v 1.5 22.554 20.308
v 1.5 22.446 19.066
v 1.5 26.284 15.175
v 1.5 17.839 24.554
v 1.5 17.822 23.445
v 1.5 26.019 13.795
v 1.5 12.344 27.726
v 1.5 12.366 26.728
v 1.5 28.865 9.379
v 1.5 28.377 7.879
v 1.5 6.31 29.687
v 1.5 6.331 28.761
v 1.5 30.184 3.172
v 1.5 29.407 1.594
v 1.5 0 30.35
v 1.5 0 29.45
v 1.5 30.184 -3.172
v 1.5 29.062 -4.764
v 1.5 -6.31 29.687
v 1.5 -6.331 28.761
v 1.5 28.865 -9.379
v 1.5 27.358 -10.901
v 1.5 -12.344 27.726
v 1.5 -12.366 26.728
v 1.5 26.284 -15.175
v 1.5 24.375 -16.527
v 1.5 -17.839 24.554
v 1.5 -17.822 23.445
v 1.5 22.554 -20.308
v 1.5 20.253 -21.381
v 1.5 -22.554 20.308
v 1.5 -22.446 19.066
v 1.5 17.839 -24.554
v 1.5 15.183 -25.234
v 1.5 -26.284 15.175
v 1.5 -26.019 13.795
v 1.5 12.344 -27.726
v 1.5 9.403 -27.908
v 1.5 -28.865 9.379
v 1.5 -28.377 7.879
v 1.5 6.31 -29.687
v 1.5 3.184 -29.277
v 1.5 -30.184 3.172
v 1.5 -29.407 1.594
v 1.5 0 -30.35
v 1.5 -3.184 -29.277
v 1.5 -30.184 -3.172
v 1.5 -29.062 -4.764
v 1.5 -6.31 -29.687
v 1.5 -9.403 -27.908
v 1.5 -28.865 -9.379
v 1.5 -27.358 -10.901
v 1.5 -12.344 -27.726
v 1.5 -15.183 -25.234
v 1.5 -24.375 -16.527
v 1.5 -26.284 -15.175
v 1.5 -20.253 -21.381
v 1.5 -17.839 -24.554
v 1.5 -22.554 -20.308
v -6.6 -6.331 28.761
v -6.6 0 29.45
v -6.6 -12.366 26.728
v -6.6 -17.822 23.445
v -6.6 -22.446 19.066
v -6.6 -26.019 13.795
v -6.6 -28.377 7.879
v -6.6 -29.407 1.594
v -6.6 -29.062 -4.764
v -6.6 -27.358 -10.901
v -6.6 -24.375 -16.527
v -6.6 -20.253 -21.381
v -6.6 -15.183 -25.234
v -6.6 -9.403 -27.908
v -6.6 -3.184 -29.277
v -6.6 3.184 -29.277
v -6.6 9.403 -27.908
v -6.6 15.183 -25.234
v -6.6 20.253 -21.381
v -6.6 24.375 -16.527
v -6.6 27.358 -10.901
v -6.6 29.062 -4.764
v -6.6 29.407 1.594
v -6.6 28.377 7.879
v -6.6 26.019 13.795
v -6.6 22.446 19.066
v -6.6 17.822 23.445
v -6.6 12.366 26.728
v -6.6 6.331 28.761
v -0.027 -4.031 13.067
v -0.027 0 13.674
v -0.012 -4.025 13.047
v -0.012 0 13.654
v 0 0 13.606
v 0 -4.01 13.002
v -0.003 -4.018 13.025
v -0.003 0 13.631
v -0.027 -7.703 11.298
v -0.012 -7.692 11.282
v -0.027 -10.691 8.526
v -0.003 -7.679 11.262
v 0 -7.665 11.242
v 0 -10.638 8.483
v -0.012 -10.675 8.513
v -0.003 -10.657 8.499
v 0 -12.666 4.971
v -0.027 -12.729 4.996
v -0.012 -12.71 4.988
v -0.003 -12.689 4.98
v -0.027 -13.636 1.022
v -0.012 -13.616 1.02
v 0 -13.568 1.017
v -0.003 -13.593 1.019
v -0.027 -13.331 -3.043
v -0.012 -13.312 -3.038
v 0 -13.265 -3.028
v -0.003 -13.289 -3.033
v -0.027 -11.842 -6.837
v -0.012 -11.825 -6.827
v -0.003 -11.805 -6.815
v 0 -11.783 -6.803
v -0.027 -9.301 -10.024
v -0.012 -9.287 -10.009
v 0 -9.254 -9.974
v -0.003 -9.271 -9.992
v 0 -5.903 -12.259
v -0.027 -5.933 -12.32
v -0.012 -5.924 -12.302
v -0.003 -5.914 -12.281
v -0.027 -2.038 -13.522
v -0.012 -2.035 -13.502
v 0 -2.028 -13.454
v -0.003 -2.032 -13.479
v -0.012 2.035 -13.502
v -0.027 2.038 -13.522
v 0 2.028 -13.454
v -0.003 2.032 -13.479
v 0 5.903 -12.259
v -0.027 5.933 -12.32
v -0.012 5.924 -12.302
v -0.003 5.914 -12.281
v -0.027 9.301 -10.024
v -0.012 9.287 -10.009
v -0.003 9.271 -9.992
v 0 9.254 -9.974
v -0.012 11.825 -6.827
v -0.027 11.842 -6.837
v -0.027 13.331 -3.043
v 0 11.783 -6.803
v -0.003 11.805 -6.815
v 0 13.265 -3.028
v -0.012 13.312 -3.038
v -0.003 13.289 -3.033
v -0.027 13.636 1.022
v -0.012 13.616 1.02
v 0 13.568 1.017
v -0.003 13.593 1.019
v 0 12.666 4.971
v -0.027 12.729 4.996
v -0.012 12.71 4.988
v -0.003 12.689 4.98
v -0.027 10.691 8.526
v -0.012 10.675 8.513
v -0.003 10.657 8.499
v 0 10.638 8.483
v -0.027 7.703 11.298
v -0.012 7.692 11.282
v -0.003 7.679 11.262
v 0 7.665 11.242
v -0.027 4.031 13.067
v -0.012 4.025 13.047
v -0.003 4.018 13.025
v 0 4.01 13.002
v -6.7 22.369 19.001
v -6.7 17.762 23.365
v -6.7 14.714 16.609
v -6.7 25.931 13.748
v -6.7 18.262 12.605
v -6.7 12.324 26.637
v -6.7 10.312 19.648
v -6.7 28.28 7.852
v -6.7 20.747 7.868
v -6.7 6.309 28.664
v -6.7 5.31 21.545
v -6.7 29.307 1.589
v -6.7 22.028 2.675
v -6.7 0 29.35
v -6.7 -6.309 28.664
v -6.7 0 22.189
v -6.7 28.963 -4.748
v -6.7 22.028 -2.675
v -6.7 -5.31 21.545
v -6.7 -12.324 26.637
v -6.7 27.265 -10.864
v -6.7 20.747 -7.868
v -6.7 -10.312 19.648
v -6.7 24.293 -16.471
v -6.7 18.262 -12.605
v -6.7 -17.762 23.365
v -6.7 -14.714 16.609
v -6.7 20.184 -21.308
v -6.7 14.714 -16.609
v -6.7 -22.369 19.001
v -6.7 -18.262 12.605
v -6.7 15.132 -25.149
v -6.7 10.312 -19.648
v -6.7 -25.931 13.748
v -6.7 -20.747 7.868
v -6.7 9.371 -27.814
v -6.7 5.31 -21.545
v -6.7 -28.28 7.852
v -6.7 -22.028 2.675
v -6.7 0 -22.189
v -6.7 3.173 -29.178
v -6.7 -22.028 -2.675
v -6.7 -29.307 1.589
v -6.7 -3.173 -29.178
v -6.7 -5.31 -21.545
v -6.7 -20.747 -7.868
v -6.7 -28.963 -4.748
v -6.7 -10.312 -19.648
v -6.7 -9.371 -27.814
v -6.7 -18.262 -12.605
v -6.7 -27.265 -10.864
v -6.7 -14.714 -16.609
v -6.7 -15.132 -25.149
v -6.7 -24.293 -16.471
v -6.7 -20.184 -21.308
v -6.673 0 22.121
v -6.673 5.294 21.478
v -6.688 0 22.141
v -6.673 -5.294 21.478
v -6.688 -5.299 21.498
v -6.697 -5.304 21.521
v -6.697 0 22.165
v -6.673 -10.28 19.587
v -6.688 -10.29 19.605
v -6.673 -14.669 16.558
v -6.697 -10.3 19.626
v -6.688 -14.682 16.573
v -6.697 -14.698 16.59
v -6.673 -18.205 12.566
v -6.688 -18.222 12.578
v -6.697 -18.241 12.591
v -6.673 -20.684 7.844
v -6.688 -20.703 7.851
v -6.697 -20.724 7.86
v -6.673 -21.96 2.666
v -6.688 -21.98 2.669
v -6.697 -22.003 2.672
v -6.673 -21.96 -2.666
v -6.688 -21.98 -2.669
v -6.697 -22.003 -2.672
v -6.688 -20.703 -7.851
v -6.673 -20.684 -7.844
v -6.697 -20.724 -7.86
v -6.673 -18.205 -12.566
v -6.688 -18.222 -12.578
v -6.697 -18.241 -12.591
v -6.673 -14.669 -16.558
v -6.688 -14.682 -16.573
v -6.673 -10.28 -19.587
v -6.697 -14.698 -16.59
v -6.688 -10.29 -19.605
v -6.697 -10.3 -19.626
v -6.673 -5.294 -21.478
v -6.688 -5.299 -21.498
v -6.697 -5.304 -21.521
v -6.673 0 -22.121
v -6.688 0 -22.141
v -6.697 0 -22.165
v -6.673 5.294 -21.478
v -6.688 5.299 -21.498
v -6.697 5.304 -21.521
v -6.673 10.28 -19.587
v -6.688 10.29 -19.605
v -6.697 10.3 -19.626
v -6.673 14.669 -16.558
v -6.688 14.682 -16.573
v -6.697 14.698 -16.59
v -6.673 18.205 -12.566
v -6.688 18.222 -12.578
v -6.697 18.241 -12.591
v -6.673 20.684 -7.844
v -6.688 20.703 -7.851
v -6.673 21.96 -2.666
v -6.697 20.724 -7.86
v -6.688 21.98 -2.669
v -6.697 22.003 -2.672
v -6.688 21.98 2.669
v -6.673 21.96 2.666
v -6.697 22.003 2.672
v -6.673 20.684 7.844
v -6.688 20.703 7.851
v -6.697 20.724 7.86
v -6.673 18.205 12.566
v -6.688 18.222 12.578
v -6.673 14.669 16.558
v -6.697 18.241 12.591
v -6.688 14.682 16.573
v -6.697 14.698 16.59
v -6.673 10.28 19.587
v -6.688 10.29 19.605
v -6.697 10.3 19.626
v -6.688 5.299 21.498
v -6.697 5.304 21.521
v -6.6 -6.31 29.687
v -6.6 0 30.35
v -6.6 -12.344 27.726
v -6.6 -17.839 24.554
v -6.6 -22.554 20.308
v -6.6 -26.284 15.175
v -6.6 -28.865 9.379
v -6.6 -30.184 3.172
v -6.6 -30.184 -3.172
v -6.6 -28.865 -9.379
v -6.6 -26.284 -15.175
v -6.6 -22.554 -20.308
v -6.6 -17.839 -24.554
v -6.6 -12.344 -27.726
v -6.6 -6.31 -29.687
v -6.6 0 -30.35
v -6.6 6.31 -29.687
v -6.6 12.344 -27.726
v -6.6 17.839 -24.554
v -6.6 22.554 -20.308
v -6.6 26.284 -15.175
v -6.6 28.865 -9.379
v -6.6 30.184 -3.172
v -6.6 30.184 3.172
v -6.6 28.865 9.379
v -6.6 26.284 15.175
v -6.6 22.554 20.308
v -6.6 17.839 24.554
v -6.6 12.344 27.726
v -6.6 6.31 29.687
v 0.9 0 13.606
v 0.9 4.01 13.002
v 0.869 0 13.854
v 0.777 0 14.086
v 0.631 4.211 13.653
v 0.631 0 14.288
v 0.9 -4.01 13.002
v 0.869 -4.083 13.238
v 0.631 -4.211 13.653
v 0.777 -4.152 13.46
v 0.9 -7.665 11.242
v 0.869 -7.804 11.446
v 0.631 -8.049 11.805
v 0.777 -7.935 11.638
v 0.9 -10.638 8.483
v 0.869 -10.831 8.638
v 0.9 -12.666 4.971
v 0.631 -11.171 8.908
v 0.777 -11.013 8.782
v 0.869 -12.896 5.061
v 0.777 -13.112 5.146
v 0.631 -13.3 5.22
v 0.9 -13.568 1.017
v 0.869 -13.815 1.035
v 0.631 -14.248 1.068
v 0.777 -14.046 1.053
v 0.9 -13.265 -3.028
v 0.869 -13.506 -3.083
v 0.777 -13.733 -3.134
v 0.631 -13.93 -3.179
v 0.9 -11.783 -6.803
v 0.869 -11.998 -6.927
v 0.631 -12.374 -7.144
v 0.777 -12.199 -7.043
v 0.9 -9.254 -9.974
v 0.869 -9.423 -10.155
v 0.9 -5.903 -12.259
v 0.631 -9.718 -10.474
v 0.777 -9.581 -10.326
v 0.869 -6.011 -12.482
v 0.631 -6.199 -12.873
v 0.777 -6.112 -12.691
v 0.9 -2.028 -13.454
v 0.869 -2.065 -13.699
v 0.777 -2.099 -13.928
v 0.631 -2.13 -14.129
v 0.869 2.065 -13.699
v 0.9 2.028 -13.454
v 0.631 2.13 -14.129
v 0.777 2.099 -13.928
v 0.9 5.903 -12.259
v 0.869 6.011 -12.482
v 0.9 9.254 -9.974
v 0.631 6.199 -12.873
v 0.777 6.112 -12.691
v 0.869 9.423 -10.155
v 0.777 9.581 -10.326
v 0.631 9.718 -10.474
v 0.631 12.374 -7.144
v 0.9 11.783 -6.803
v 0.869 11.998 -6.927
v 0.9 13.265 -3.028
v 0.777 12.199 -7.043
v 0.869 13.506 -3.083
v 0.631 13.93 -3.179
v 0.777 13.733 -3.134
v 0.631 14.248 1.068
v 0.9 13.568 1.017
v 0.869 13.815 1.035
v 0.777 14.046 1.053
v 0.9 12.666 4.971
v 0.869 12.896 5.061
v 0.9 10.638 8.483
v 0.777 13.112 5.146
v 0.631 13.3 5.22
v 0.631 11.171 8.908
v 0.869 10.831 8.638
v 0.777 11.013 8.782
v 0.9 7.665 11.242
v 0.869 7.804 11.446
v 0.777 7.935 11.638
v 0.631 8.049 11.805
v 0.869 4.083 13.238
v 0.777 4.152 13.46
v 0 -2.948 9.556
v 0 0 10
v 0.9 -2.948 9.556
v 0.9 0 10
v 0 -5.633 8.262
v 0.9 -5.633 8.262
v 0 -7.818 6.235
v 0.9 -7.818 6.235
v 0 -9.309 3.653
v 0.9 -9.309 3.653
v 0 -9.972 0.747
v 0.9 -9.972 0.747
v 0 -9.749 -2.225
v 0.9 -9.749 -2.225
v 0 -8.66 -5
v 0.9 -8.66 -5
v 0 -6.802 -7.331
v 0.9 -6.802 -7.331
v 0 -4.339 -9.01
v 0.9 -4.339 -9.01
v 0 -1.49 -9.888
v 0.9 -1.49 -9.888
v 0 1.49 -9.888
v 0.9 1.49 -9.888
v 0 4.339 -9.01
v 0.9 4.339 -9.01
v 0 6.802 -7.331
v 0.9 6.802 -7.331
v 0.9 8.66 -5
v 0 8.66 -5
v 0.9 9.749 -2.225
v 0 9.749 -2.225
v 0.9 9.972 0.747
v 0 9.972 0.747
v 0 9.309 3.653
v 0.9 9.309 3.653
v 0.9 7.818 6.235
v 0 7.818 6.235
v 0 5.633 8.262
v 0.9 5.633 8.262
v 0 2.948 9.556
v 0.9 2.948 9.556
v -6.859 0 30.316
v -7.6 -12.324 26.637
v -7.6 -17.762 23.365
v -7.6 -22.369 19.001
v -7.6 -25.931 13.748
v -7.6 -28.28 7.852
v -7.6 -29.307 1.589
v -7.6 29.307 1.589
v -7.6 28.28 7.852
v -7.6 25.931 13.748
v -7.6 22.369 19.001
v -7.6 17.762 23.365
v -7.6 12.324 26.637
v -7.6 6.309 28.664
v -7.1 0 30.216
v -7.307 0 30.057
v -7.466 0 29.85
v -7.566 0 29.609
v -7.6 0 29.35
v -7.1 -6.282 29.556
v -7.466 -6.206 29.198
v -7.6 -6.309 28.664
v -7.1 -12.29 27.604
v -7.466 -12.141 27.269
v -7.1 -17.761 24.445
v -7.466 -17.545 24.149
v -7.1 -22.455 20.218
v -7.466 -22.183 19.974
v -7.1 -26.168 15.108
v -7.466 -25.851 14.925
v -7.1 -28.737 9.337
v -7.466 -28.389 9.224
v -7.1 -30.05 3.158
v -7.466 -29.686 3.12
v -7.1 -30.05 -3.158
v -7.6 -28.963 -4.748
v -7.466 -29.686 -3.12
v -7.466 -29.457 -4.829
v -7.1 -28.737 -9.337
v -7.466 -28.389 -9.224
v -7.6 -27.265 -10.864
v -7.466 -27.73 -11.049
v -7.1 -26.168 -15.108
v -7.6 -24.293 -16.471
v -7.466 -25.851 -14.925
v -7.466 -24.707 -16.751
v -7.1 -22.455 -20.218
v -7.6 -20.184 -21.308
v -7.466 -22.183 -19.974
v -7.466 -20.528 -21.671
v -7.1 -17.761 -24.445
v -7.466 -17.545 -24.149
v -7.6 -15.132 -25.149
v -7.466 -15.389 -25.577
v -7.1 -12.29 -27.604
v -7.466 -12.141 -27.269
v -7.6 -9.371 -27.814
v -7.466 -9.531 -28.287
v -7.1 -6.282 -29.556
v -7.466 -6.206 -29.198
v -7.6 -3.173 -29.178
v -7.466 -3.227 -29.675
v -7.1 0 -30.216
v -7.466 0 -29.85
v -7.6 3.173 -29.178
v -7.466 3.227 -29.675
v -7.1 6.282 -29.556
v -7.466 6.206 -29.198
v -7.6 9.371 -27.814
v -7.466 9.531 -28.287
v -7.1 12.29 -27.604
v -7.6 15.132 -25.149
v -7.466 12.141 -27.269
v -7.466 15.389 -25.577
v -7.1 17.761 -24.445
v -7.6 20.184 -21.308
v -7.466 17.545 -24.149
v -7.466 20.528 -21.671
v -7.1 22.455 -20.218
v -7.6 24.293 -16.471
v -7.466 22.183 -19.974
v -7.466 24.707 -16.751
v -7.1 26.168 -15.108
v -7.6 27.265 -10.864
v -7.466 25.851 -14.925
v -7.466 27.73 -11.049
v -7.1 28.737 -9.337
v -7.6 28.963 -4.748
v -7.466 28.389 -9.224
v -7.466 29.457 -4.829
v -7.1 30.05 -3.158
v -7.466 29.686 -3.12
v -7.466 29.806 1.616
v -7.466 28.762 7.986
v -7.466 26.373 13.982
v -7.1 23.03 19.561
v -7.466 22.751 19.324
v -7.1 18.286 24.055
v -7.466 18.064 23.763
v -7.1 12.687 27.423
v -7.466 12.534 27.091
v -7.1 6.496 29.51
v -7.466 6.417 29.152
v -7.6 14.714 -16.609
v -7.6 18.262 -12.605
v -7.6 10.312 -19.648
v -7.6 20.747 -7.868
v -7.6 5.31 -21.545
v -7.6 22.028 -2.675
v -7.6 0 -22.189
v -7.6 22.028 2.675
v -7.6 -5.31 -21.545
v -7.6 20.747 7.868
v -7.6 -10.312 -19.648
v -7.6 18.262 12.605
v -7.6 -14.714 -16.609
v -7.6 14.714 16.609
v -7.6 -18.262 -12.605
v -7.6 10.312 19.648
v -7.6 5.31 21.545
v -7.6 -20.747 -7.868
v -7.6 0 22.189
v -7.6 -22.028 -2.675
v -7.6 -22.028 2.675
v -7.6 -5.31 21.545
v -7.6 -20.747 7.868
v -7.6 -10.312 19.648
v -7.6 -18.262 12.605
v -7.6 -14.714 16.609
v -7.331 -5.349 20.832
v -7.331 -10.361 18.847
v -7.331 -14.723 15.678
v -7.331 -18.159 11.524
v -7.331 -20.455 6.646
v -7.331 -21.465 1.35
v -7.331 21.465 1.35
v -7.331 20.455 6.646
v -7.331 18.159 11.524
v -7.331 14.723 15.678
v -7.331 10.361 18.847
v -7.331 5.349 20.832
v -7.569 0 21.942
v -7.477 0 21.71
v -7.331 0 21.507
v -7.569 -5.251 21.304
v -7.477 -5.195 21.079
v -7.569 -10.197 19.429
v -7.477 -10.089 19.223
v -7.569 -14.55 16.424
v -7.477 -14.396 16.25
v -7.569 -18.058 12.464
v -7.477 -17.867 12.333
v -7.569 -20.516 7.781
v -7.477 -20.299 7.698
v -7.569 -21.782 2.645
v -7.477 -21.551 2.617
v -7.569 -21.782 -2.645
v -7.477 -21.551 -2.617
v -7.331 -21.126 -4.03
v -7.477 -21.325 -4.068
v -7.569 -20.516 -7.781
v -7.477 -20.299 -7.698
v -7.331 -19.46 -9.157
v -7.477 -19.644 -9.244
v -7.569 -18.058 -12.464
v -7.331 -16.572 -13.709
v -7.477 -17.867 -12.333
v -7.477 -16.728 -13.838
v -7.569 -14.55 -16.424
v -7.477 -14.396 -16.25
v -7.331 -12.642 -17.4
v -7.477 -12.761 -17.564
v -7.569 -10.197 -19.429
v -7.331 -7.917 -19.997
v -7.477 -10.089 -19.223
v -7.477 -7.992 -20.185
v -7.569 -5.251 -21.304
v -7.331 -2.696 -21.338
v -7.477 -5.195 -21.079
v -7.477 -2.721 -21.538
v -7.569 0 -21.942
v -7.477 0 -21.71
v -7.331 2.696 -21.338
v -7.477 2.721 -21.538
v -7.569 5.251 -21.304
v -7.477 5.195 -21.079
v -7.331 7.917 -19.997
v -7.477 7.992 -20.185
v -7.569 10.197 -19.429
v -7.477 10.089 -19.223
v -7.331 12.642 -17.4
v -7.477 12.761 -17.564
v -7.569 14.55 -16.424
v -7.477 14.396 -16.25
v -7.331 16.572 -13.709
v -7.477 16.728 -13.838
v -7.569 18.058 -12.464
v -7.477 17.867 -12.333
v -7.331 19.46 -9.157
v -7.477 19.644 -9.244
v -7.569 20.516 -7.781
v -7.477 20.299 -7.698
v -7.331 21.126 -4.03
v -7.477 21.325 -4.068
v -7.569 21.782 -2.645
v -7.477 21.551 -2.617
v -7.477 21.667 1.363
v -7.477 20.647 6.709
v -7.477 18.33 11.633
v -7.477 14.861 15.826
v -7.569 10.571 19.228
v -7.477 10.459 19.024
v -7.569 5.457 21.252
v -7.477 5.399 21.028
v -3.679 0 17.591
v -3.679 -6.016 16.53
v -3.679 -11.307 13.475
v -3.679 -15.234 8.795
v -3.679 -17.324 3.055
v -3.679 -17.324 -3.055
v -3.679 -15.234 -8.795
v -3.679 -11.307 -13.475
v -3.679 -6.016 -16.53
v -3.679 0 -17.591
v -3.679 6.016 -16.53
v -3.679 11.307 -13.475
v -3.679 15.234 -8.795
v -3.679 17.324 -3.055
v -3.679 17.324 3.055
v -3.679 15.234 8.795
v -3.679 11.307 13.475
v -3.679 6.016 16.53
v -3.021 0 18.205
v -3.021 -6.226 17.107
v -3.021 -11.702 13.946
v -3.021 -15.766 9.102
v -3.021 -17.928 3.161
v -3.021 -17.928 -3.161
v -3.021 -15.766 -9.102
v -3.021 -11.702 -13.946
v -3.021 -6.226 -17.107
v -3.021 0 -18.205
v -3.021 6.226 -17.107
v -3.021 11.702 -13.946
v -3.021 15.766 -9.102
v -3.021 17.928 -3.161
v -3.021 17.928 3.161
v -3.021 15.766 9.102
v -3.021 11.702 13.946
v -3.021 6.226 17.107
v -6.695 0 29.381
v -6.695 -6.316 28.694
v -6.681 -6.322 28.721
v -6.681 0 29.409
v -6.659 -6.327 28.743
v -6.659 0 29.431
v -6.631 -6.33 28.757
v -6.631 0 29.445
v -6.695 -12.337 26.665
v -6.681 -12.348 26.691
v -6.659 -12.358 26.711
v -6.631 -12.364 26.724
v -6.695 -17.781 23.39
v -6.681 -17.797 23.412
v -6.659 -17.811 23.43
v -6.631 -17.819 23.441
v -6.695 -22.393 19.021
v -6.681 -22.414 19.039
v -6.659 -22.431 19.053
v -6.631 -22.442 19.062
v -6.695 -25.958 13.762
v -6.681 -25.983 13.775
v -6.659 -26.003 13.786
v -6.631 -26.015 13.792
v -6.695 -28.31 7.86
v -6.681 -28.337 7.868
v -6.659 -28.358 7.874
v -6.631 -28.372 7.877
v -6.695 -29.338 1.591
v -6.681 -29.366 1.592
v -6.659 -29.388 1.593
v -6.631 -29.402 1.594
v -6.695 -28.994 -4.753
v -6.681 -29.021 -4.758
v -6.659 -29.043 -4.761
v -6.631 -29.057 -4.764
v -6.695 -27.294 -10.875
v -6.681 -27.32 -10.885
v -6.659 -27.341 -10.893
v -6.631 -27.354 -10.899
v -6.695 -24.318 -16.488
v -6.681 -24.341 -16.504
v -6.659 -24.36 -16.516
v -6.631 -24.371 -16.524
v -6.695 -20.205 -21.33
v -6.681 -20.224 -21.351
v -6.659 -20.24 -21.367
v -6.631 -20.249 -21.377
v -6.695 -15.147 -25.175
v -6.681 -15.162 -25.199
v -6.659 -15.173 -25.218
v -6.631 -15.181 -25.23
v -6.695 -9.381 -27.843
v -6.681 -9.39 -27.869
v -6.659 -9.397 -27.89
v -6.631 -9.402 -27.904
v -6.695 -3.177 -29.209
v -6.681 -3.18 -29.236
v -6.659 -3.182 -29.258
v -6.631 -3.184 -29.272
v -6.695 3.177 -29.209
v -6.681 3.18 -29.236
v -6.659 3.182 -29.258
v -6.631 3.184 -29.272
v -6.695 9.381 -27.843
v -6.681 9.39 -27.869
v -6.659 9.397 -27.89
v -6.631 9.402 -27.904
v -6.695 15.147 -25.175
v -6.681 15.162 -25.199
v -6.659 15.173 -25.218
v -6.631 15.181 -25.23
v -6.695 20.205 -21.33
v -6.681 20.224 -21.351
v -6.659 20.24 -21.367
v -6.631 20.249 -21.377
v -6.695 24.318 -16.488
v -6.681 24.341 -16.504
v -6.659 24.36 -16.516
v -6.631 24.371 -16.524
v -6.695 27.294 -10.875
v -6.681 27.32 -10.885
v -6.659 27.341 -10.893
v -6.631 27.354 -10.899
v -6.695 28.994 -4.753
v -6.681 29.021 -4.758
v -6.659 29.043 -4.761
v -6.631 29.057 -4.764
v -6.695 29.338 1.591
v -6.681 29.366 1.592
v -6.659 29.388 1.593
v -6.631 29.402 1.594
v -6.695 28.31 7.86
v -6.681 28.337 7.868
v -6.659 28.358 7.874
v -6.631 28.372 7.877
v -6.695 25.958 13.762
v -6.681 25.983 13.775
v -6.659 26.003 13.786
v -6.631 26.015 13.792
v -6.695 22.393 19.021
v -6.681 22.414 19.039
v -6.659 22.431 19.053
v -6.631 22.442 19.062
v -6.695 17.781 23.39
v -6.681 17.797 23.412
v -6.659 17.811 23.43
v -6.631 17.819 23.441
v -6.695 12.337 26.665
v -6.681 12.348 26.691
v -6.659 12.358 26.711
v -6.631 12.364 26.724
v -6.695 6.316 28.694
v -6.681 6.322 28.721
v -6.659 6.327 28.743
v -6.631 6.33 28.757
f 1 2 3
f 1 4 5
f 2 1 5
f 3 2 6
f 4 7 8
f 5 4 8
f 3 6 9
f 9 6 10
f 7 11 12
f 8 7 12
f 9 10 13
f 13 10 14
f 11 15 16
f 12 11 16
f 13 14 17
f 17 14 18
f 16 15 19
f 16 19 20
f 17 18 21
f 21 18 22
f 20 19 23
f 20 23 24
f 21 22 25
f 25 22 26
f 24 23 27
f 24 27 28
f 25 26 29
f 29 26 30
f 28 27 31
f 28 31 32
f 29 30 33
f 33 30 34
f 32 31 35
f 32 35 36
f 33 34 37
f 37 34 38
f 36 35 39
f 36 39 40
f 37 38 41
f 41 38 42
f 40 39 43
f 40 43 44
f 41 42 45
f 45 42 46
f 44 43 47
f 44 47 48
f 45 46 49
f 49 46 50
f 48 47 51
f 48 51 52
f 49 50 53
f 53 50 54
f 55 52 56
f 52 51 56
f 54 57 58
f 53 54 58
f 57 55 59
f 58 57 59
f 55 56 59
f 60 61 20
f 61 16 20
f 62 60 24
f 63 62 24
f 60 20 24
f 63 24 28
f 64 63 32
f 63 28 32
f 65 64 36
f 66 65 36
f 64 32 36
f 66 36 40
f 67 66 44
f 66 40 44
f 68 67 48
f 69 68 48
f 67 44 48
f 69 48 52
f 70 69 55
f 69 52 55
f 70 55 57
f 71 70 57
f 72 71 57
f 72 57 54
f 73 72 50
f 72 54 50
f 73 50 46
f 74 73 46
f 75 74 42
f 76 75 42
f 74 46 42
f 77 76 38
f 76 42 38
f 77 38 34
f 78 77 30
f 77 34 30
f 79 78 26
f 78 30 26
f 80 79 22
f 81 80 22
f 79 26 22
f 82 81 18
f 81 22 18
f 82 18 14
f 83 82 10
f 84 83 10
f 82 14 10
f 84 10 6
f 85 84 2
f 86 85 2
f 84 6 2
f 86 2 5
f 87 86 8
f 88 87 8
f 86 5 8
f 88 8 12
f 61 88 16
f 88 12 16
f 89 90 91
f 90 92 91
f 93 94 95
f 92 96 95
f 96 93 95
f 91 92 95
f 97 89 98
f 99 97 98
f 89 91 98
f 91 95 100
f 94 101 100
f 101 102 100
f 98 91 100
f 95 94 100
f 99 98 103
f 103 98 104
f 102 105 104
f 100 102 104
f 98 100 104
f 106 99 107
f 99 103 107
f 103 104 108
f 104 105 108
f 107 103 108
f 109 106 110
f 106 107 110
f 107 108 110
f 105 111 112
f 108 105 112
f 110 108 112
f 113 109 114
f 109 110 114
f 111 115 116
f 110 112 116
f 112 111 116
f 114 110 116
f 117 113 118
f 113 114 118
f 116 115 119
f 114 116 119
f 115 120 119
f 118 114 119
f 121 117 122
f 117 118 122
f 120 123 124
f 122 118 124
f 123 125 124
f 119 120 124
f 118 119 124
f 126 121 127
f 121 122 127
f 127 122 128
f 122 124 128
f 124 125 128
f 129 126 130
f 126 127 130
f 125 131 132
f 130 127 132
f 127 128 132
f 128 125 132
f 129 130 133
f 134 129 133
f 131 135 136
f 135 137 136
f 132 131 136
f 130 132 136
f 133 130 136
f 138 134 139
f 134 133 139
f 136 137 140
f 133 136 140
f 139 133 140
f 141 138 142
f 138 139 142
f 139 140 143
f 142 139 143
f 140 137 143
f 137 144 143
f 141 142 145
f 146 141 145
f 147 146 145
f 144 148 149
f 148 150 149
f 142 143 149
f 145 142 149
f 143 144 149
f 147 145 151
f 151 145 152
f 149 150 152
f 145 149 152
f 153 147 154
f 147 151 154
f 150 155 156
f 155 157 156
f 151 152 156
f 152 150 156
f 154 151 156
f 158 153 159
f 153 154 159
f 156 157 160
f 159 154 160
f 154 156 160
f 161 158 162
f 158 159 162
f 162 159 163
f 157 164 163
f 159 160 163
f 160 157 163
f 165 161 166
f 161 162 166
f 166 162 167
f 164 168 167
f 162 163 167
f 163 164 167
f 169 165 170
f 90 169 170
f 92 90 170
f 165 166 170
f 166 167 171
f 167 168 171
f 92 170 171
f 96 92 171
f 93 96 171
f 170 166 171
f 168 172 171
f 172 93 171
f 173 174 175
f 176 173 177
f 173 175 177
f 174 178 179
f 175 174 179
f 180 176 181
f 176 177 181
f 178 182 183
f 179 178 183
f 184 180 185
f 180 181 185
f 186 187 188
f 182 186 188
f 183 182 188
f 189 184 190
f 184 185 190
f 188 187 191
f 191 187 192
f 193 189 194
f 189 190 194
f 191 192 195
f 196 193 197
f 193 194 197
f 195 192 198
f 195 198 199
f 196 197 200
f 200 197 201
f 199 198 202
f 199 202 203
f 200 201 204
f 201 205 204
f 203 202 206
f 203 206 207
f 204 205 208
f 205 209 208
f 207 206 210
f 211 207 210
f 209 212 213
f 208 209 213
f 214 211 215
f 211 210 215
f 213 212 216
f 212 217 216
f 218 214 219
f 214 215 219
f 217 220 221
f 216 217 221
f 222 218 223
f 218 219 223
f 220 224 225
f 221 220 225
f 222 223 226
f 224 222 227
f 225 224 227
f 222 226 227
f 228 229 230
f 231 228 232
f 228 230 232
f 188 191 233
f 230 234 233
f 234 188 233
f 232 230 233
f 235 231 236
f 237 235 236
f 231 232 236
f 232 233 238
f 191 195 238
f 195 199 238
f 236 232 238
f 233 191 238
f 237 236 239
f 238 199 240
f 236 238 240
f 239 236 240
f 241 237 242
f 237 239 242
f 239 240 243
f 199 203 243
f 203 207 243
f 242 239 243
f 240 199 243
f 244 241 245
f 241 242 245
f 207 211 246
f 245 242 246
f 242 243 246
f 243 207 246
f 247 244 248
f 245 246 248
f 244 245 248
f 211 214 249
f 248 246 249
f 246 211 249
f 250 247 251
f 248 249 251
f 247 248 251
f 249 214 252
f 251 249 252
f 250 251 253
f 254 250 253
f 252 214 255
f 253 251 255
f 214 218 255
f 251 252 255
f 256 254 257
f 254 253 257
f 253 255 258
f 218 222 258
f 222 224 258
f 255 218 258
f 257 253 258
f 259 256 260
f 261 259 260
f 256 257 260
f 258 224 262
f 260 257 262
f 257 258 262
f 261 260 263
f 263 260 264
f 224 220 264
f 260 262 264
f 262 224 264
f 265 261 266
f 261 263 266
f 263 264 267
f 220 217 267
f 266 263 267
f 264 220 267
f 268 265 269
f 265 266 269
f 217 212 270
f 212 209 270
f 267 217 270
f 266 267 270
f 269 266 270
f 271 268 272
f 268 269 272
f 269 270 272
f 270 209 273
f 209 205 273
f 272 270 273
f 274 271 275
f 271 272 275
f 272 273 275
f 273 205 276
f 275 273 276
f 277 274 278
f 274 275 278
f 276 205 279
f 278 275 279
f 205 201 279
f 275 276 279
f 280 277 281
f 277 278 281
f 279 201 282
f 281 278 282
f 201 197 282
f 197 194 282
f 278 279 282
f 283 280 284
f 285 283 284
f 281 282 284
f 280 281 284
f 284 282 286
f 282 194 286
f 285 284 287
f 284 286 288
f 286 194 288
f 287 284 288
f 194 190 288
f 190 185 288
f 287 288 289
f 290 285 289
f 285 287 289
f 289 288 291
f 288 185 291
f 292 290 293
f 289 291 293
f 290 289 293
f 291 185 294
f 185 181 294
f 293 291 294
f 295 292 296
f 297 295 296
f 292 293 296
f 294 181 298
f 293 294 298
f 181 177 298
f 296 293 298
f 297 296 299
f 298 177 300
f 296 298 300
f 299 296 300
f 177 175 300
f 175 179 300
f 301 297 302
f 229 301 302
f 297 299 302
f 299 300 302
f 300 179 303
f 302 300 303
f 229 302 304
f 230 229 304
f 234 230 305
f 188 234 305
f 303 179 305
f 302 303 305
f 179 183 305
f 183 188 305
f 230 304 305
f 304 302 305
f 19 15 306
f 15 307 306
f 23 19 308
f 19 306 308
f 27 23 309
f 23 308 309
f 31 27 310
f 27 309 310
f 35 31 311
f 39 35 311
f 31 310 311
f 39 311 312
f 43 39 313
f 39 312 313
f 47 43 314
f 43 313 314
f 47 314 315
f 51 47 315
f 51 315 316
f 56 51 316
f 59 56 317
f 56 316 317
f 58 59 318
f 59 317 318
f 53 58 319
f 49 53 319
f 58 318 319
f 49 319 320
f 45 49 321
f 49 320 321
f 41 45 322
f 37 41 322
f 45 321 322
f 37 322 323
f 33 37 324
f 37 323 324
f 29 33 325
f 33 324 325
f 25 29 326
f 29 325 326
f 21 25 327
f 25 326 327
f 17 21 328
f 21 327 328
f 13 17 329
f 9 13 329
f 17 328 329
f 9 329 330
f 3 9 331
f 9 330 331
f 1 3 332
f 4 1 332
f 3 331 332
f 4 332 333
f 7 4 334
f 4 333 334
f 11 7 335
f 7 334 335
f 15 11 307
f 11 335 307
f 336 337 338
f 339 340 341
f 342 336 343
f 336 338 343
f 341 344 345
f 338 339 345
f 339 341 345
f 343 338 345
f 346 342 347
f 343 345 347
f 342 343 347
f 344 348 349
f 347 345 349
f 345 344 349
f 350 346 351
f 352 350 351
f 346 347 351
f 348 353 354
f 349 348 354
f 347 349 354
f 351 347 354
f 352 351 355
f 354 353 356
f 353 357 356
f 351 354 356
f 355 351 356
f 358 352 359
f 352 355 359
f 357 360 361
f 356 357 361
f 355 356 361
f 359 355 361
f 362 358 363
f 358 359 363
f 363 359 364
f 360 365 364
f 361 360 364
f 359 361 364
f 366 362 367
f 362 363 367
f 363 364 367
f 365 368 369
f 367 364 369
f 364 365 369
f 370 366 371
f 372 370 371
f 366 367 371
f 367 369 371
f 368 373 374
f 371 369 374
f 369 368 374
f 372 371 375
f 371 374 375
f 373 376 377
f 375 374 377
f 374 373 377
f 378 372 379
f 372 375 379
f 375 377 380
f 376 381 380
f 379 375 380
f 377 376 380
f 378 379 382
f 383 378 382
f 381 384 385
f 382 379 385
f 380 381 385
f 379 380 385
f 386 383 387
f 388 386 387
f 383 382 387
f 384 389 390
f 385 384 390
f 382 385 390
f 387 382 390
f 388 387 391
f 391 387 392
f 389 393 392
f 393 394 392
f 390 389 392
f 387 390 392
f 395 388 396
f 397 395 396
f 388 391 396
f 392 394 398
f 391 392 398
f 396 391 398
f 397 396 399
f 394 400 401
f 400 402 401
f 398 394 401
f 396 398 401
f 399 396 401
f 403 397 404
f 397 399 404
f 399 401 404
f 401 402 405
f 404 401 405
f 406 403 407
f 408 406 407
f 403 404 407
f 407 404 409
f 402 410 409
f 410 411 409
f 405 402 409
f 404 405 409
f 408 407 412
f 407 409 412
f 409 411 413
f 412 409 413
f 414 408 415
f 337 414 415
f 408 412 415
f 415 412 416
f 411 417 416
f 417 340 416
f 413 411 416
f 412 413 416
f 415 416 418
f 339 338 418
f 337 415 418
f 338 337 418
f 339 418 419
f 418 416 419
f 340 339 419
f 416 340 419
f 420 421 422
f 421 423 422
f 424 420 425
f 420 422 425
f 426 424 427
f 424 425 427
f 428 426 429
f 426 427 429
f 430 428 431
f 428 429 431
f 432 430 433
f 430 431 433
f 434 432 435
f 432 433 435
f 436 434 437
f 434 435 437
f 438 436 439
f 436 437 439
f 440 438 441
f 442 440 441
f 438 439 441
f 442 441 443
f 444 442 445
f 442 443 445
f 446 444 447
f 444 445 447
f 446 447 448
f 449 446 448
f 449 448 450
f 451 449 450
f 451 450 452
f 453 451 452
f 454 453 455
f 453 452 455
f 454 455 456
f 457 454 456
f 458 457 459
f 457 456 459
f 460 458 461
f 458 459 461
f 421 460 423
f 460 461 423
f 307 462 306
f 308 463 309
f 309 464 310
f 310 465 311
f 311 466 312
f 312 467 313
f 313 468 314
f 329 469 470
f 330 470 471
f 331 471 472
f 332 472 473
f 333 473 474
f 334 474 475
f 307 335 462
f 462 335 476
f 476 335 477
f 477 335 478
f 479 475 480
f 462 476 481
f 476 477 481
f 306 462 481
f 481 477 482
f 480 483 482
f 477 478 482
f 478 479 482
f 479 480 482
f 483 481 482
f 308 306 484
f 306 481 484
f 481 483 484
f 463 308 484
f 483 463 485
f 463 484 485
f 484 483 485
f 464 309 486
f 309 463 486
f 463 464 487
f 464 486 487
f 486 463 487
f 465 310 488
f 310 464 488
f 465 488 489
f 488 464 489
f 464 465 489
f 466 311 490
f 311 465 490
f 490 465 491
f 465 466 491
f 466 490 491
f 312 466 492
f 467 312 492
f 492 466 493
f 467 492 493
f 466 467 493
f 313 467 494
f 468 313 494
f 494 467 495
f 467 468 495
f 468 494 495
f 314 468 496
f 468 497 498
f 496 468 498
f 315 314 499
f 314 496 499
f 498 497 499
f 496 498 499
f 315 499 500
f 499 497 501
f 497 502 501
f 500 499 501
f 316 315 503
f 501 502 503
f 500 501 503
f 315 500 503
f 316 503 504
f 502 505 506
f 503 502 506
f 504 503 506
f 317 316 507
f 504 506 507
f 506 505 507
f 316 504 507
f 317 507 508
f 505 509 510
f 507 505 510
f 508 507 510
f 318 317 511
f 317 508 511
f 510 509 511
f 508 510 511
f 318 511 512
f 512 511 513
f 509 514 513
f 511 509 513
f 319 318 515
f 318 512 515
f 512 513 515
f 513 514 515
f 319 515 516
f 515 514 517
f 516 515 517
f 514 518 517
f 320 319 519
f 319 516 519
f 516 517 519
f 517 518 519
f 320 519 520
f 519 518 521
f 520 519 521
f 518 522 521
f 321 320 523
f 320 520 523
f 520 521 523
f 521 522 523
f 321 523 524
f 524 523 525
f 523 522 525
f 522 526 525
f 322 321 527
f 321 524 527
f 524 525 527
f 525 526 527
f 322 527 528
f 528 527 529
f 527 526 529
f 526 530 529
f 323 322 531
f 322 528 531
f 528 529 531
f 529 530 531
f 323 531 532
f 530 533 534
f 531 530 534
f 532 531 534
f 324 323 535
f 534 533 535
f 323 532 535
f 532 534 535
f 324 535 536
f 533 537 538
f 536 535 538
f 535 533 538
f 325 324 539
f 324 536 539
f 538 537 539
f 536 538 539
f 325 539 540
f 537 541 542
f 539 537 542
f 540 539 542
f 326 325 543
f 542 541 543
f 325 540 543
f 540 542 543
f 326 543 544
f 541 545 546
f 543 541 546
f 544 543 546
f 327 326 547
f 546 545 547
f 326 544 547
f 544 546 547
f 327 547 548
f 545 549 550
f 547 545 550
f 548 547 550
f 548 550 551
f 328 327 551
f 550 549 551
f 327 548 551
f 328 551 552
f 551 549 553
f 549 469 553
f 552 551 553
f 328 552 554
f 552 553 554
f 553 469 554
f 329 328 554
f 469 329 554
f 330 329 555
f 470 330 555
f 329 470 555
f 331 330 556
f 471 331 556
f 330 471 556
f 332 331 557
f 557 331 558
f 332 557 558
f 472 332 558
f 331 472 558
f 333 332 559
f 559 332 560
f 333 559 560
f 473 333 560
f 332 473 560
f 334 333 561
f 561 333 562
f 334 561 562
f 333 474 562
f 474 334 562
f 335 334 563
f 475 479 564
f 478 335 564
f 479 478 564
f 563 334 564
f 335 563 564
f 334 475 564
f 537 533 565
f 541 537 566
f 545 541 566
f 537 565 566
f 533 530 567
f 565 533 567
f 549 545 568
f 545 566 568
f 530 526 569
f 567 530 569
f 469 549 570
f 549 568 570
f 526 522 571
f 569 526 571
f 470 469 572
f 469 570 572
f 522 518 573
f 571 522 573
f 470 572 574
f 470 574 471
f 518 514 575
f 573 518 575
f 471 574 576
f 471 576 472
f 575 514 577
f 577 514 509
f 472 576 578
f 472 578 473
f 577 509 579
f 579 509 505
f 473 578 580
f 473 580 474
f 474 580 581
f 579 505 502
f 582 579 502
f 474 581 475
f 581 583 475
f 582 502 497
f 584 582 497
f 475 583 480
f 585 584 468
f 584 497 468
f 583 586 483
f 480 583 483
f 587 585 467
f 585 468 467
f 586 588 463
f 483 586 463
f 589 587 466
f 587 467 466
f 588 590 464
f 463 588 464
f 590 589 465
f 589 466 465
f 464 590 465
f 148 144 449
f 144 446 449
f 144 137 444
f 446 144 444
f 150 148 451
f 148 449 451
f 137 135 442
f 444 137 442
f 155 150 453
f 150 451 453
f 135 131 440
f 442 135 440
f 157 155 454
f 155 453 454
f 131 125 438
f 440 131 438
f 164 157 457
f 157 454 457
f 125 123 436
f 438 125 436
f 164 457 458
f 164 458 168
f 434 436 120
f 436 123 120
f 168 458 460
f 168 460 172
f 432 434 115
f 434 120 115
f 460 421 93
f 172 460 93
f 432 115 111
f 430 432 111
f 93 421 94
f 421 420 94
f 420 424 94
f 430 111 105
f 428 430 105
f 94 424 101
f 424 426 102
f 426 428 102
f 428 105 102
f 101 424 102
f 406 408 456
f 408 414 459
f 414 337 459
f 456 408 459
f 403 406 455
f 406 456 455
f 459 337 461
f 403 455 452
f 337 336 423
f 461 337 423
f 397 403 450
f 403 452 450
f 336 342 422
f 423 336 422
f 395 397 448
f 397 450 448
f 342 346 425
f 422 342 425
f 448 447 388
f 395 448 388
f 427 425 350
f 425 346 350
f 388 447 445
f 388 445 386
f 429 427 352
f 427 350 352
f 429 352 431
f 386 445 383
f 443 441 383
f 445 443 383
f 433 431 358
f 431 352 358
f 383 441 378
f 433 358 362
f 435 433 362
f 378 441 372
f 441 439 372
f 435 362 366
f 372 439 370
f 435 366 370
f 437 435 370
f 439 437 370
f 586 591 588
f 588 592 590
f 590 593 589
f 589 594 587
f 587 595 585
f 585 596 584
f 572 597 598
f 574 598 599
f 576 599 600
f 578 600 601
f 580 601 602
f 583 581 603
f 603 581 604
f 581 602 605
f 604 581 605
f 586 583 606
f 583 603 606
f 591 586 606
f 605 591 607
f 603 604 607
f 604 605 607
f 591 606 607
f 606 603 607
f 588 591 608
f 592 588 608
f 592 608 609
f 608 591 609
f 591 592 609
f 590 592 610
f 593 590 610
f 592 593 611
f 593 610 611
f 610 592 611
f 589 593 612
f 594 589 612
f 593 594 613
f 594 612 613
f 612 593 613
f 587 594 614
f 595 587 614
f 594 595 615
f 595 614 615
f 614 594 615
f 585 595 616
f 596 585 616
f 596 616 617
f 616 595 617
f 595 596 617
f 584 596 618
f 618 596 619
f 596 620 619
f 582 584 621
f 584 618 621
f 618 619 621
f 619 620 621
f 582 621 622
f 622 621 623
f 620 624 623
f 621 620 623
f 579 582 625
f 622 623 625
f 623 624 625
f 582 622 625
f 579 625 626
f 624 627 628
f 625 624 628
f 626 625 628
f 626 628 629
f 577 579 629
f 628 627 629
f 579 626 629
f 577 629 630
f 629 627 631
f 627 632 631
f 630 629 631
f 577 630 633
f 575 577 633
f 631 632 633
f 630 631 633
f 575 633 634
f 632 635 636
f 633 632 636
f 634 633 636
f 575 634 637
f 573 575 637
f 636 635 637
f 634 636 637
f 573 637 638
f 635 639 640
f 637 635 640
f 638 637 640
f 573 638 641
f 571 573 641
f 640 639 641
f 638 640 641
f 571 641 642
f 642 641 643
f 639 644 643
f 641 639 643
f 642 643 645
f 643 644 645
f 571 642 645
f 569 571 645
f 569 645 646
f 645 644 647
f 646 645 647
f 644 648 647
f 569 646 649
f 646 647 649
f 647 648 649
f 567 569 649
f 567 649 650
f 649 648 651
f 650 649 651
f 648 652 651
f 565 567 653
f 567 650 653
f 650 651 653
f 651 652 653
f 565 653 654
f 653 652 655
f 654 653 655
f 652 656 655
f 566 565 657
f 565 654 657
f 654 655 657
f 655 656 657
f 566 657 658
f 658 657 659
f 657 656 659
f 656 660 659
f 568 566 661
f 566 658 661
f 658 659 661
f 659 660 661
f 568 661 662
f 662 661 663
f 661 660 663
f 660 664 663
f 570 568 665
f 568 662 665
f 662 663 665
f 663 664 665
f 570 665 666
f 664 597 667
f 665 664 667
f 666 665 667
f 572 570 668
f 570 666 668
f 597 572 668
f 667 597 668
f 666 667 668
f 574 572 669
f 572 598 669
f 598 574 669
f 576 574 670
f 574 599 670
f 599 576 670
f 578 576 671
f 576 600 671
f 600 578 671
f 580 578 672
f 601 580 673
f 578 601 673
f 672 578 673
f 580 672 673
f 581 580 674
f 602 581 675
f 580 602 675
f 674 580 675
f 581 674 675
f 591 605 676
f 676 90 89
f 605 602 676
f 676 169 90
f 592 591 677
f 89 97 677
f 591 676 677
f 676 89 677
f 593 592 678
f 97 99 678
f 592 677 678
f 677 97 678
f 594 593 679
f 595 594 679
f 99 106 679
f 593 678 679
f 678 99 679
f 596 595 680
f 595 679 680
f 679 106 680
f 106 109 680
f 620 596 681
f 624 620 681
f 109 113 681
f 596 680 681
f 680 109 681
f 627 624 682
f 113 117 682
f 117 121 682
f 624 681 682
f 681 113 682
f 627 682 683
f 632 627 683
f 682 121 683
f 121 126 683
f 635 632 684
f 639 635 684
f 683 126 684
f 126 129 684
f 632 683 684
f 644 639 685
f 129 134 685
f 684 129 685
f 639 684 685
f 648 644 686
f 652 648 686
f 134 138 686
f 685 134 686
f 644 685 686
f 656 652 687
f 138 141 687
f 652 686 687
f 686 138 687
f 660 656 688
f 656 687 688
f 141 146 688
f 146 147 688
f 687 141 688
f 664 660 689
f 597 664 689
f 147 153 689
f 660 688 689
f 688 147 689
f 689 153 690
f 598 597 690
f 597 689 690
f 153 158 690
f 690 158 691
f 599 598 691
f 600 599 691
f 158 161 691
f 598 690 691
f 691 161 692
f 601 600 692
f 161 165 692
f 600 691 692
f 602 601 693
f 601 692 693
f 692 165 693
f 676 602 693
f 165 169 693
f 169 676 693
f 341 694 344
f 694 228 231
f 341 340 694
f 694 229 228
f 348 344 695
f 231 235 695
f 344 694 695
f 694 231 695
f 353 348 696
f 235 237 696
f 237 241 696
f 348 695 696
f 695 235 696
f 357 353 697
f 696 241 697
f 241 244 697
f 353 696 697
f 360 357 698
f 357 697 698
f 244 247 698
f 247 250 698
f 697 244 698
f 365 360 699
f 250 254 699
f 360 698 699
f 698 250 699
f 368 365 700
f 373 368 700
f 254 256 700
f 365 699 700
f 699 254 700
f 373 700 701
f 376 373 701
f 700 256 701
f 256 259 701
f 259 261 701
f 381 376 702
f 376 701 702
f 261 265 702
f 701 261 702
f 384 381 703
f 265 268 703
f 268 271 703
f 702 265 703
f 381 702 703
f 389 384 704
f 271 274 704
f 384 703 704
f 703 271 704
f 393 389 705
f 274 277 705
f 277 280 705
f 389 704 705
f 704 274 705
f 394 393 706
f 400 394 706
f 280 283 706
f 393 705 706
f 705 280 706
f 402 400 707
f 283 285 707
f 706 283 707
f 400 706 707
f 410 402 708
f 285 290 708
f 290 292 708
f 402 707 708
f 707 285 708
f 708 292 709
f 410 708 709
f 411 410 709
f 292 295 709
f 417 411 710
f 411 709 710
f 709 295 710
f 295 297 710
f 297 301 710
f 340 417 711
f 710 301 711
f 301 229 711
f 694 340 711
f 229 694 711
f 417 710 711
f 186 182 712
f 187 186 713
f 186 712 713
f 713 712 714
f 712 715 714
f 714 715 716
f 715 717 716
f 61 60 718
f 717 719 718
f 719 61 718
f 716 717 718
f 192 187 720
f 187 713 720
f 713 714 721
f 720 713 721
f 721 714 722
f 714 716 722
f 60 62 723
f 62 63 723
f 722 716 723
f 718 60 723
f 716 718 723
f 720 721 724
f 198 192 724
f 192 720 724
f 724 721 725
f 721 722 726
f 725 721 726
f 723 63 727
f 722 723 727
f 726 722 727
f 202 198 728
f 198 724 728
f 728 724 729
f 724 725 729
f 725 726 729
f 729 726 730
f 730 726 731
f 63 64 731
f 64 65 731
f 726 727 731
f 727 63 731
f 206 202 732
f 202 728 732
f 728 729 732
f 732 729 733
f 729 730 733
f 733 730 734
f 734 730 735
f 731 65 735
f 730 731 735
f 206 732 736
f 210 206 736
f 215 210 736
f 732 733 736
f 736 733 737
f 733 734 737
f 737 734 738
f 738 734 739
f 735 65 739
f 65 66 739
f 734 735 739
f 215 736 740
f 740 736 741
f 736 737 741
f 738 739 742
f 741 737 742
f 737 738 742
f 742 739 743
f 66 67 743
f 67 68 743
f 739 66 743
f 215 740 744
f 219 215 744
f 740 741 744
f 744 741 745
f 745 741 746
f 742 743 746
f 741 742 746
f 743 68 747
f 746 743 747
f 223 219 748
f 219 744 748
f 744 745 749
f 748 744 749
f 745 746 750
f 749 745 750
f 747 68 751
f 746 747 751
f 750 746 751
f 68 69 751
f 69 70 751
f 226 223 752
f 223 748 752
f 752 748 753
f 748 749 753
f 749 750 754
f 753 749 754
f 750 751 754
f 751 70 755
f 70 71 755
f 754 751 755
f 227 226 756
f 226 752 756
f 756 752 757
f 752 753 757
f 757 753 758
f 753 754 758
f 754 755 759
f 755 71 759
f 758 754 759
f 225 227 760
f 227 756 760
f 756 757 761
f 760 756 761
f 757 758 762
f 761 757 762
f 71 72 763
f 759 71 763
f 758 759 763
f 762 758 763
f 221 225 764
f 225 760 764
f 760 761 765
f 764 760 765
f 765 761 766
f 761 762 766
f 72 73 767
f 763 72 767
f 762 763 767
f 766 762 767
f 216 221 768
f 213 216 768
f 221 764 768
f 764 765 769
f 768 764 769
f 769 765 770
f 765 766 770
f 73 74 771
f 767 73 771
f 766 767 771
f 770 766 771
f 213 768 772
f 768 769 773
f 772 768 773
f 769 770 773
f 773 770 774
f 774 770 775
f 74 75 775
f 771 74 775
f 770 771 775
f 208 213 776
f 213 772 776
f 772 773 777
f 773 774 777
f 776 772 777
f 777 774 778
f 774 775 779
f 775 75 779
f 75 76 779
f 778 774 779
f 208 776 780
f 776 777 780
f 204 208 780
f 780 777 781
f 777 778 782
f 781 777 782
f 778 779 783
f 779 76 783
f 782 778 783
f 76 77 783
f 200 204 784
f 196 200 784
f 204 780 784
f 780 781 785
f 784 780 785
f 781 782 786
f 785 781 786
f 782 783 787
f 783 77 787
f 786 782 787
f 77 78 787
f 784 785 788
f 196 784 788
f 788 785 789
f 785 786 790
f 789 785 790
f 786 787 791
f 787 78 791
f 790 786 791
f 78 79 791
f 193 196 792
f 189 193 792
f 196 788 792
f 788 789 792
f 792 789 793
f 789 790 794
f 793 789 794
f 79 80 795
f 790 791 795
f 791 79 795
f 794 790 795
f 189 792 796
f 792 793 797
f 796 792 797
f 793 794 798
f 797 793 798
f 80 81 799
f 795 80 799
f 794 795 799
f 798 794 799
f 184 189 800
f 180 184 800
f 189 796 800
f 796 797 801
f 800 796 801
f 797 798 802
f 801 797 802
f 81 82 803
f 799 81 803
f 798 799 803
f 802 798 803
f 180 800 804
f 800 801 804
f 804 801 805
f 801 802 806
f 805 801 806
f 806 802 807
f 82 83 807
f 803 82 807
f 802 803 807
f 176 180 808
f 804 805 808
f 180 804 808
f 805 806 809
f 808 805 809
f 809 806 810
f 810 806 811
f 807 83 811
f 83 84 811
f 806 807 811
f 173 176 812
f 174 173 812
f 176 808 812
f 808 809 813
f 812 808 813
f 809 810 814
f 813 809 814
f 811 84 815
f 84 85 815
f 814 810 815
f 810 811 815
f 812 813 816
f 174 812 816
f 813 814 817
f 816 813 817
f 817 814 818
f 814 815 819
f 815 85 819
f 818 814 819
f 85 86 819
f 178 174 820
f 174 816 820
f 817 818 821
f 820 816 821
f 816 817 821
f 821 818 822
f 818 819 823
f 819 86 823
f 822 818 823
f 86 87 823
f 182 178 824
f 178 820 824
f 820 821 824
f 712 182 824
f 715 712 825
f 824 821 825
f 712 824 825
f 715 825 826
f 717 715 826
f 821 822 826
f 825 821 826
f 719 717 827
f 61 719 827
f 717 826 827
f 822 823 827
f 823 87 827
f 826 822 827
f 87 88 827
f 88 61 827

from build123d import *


with BuildPart() as part:
    # Croquis1 → Revolución1 (revolve)
    with BuildSketch(Plane.XY, mode=Mode.PRIVATE) as revoluci_n1_sk:
        with BuildLine():
            Line((0.9, -10), (0.9, -13.606089524))
            ThreePointArc((0.9, -13.606089524), (0.830417568, -13.972590751), (0.631353702, -14.288087884))
            Line((0.631353702, -14.288087884), (-6.67313537, -22.121193408))
            ThreePointArc((-6.67313537, -22.121193408), (-6.693041757, -22.152743121), (-6.7, -22.189393244))
            Line((-6.7, -22.189393244), (-6.7, -29.35))
            ThreePointArc((-6.7, -29.35), (-6.670710678, -29.420710678), (-6.6, -29.45))
            Line((-6.6, -29.45), (1.5, -29.45))
            Line((1.5, -29.45), (1.5, -30.35))
            Line((1.5, -30.35), (-6.6, -30.35))
            ThreePointArc((-6.6, -30.35), (-7.307106781, -30.057106781), (-7.6, -29.35))
            Line((-7.6, -29.35), (-7.6, -22.189393244))
            ThreePointArc((-7.6, -22.189393244), (-7.530417568, -21.822892017), (-7.331353702, -21.507394884))
            Line((-7.331353702, -21.507394884), (-0.02686463, -13.67428936))
            ThreePointArc((-0.02686463, -13.67428936), (-0.006958243, -13.642739647), (0, -13.606089524))
            Line((0, -13.606089524), (0, -10))
            Line((0, -10), (0.9, -10))
        make_face()
    revolve(revoluci_n1_sk.sketch.rotate(Axis((0, 0, 0), (1, 0, 0)), 270), axis=Axis((0, 0, 0), (1, 0, 0)))


solid = part.part
